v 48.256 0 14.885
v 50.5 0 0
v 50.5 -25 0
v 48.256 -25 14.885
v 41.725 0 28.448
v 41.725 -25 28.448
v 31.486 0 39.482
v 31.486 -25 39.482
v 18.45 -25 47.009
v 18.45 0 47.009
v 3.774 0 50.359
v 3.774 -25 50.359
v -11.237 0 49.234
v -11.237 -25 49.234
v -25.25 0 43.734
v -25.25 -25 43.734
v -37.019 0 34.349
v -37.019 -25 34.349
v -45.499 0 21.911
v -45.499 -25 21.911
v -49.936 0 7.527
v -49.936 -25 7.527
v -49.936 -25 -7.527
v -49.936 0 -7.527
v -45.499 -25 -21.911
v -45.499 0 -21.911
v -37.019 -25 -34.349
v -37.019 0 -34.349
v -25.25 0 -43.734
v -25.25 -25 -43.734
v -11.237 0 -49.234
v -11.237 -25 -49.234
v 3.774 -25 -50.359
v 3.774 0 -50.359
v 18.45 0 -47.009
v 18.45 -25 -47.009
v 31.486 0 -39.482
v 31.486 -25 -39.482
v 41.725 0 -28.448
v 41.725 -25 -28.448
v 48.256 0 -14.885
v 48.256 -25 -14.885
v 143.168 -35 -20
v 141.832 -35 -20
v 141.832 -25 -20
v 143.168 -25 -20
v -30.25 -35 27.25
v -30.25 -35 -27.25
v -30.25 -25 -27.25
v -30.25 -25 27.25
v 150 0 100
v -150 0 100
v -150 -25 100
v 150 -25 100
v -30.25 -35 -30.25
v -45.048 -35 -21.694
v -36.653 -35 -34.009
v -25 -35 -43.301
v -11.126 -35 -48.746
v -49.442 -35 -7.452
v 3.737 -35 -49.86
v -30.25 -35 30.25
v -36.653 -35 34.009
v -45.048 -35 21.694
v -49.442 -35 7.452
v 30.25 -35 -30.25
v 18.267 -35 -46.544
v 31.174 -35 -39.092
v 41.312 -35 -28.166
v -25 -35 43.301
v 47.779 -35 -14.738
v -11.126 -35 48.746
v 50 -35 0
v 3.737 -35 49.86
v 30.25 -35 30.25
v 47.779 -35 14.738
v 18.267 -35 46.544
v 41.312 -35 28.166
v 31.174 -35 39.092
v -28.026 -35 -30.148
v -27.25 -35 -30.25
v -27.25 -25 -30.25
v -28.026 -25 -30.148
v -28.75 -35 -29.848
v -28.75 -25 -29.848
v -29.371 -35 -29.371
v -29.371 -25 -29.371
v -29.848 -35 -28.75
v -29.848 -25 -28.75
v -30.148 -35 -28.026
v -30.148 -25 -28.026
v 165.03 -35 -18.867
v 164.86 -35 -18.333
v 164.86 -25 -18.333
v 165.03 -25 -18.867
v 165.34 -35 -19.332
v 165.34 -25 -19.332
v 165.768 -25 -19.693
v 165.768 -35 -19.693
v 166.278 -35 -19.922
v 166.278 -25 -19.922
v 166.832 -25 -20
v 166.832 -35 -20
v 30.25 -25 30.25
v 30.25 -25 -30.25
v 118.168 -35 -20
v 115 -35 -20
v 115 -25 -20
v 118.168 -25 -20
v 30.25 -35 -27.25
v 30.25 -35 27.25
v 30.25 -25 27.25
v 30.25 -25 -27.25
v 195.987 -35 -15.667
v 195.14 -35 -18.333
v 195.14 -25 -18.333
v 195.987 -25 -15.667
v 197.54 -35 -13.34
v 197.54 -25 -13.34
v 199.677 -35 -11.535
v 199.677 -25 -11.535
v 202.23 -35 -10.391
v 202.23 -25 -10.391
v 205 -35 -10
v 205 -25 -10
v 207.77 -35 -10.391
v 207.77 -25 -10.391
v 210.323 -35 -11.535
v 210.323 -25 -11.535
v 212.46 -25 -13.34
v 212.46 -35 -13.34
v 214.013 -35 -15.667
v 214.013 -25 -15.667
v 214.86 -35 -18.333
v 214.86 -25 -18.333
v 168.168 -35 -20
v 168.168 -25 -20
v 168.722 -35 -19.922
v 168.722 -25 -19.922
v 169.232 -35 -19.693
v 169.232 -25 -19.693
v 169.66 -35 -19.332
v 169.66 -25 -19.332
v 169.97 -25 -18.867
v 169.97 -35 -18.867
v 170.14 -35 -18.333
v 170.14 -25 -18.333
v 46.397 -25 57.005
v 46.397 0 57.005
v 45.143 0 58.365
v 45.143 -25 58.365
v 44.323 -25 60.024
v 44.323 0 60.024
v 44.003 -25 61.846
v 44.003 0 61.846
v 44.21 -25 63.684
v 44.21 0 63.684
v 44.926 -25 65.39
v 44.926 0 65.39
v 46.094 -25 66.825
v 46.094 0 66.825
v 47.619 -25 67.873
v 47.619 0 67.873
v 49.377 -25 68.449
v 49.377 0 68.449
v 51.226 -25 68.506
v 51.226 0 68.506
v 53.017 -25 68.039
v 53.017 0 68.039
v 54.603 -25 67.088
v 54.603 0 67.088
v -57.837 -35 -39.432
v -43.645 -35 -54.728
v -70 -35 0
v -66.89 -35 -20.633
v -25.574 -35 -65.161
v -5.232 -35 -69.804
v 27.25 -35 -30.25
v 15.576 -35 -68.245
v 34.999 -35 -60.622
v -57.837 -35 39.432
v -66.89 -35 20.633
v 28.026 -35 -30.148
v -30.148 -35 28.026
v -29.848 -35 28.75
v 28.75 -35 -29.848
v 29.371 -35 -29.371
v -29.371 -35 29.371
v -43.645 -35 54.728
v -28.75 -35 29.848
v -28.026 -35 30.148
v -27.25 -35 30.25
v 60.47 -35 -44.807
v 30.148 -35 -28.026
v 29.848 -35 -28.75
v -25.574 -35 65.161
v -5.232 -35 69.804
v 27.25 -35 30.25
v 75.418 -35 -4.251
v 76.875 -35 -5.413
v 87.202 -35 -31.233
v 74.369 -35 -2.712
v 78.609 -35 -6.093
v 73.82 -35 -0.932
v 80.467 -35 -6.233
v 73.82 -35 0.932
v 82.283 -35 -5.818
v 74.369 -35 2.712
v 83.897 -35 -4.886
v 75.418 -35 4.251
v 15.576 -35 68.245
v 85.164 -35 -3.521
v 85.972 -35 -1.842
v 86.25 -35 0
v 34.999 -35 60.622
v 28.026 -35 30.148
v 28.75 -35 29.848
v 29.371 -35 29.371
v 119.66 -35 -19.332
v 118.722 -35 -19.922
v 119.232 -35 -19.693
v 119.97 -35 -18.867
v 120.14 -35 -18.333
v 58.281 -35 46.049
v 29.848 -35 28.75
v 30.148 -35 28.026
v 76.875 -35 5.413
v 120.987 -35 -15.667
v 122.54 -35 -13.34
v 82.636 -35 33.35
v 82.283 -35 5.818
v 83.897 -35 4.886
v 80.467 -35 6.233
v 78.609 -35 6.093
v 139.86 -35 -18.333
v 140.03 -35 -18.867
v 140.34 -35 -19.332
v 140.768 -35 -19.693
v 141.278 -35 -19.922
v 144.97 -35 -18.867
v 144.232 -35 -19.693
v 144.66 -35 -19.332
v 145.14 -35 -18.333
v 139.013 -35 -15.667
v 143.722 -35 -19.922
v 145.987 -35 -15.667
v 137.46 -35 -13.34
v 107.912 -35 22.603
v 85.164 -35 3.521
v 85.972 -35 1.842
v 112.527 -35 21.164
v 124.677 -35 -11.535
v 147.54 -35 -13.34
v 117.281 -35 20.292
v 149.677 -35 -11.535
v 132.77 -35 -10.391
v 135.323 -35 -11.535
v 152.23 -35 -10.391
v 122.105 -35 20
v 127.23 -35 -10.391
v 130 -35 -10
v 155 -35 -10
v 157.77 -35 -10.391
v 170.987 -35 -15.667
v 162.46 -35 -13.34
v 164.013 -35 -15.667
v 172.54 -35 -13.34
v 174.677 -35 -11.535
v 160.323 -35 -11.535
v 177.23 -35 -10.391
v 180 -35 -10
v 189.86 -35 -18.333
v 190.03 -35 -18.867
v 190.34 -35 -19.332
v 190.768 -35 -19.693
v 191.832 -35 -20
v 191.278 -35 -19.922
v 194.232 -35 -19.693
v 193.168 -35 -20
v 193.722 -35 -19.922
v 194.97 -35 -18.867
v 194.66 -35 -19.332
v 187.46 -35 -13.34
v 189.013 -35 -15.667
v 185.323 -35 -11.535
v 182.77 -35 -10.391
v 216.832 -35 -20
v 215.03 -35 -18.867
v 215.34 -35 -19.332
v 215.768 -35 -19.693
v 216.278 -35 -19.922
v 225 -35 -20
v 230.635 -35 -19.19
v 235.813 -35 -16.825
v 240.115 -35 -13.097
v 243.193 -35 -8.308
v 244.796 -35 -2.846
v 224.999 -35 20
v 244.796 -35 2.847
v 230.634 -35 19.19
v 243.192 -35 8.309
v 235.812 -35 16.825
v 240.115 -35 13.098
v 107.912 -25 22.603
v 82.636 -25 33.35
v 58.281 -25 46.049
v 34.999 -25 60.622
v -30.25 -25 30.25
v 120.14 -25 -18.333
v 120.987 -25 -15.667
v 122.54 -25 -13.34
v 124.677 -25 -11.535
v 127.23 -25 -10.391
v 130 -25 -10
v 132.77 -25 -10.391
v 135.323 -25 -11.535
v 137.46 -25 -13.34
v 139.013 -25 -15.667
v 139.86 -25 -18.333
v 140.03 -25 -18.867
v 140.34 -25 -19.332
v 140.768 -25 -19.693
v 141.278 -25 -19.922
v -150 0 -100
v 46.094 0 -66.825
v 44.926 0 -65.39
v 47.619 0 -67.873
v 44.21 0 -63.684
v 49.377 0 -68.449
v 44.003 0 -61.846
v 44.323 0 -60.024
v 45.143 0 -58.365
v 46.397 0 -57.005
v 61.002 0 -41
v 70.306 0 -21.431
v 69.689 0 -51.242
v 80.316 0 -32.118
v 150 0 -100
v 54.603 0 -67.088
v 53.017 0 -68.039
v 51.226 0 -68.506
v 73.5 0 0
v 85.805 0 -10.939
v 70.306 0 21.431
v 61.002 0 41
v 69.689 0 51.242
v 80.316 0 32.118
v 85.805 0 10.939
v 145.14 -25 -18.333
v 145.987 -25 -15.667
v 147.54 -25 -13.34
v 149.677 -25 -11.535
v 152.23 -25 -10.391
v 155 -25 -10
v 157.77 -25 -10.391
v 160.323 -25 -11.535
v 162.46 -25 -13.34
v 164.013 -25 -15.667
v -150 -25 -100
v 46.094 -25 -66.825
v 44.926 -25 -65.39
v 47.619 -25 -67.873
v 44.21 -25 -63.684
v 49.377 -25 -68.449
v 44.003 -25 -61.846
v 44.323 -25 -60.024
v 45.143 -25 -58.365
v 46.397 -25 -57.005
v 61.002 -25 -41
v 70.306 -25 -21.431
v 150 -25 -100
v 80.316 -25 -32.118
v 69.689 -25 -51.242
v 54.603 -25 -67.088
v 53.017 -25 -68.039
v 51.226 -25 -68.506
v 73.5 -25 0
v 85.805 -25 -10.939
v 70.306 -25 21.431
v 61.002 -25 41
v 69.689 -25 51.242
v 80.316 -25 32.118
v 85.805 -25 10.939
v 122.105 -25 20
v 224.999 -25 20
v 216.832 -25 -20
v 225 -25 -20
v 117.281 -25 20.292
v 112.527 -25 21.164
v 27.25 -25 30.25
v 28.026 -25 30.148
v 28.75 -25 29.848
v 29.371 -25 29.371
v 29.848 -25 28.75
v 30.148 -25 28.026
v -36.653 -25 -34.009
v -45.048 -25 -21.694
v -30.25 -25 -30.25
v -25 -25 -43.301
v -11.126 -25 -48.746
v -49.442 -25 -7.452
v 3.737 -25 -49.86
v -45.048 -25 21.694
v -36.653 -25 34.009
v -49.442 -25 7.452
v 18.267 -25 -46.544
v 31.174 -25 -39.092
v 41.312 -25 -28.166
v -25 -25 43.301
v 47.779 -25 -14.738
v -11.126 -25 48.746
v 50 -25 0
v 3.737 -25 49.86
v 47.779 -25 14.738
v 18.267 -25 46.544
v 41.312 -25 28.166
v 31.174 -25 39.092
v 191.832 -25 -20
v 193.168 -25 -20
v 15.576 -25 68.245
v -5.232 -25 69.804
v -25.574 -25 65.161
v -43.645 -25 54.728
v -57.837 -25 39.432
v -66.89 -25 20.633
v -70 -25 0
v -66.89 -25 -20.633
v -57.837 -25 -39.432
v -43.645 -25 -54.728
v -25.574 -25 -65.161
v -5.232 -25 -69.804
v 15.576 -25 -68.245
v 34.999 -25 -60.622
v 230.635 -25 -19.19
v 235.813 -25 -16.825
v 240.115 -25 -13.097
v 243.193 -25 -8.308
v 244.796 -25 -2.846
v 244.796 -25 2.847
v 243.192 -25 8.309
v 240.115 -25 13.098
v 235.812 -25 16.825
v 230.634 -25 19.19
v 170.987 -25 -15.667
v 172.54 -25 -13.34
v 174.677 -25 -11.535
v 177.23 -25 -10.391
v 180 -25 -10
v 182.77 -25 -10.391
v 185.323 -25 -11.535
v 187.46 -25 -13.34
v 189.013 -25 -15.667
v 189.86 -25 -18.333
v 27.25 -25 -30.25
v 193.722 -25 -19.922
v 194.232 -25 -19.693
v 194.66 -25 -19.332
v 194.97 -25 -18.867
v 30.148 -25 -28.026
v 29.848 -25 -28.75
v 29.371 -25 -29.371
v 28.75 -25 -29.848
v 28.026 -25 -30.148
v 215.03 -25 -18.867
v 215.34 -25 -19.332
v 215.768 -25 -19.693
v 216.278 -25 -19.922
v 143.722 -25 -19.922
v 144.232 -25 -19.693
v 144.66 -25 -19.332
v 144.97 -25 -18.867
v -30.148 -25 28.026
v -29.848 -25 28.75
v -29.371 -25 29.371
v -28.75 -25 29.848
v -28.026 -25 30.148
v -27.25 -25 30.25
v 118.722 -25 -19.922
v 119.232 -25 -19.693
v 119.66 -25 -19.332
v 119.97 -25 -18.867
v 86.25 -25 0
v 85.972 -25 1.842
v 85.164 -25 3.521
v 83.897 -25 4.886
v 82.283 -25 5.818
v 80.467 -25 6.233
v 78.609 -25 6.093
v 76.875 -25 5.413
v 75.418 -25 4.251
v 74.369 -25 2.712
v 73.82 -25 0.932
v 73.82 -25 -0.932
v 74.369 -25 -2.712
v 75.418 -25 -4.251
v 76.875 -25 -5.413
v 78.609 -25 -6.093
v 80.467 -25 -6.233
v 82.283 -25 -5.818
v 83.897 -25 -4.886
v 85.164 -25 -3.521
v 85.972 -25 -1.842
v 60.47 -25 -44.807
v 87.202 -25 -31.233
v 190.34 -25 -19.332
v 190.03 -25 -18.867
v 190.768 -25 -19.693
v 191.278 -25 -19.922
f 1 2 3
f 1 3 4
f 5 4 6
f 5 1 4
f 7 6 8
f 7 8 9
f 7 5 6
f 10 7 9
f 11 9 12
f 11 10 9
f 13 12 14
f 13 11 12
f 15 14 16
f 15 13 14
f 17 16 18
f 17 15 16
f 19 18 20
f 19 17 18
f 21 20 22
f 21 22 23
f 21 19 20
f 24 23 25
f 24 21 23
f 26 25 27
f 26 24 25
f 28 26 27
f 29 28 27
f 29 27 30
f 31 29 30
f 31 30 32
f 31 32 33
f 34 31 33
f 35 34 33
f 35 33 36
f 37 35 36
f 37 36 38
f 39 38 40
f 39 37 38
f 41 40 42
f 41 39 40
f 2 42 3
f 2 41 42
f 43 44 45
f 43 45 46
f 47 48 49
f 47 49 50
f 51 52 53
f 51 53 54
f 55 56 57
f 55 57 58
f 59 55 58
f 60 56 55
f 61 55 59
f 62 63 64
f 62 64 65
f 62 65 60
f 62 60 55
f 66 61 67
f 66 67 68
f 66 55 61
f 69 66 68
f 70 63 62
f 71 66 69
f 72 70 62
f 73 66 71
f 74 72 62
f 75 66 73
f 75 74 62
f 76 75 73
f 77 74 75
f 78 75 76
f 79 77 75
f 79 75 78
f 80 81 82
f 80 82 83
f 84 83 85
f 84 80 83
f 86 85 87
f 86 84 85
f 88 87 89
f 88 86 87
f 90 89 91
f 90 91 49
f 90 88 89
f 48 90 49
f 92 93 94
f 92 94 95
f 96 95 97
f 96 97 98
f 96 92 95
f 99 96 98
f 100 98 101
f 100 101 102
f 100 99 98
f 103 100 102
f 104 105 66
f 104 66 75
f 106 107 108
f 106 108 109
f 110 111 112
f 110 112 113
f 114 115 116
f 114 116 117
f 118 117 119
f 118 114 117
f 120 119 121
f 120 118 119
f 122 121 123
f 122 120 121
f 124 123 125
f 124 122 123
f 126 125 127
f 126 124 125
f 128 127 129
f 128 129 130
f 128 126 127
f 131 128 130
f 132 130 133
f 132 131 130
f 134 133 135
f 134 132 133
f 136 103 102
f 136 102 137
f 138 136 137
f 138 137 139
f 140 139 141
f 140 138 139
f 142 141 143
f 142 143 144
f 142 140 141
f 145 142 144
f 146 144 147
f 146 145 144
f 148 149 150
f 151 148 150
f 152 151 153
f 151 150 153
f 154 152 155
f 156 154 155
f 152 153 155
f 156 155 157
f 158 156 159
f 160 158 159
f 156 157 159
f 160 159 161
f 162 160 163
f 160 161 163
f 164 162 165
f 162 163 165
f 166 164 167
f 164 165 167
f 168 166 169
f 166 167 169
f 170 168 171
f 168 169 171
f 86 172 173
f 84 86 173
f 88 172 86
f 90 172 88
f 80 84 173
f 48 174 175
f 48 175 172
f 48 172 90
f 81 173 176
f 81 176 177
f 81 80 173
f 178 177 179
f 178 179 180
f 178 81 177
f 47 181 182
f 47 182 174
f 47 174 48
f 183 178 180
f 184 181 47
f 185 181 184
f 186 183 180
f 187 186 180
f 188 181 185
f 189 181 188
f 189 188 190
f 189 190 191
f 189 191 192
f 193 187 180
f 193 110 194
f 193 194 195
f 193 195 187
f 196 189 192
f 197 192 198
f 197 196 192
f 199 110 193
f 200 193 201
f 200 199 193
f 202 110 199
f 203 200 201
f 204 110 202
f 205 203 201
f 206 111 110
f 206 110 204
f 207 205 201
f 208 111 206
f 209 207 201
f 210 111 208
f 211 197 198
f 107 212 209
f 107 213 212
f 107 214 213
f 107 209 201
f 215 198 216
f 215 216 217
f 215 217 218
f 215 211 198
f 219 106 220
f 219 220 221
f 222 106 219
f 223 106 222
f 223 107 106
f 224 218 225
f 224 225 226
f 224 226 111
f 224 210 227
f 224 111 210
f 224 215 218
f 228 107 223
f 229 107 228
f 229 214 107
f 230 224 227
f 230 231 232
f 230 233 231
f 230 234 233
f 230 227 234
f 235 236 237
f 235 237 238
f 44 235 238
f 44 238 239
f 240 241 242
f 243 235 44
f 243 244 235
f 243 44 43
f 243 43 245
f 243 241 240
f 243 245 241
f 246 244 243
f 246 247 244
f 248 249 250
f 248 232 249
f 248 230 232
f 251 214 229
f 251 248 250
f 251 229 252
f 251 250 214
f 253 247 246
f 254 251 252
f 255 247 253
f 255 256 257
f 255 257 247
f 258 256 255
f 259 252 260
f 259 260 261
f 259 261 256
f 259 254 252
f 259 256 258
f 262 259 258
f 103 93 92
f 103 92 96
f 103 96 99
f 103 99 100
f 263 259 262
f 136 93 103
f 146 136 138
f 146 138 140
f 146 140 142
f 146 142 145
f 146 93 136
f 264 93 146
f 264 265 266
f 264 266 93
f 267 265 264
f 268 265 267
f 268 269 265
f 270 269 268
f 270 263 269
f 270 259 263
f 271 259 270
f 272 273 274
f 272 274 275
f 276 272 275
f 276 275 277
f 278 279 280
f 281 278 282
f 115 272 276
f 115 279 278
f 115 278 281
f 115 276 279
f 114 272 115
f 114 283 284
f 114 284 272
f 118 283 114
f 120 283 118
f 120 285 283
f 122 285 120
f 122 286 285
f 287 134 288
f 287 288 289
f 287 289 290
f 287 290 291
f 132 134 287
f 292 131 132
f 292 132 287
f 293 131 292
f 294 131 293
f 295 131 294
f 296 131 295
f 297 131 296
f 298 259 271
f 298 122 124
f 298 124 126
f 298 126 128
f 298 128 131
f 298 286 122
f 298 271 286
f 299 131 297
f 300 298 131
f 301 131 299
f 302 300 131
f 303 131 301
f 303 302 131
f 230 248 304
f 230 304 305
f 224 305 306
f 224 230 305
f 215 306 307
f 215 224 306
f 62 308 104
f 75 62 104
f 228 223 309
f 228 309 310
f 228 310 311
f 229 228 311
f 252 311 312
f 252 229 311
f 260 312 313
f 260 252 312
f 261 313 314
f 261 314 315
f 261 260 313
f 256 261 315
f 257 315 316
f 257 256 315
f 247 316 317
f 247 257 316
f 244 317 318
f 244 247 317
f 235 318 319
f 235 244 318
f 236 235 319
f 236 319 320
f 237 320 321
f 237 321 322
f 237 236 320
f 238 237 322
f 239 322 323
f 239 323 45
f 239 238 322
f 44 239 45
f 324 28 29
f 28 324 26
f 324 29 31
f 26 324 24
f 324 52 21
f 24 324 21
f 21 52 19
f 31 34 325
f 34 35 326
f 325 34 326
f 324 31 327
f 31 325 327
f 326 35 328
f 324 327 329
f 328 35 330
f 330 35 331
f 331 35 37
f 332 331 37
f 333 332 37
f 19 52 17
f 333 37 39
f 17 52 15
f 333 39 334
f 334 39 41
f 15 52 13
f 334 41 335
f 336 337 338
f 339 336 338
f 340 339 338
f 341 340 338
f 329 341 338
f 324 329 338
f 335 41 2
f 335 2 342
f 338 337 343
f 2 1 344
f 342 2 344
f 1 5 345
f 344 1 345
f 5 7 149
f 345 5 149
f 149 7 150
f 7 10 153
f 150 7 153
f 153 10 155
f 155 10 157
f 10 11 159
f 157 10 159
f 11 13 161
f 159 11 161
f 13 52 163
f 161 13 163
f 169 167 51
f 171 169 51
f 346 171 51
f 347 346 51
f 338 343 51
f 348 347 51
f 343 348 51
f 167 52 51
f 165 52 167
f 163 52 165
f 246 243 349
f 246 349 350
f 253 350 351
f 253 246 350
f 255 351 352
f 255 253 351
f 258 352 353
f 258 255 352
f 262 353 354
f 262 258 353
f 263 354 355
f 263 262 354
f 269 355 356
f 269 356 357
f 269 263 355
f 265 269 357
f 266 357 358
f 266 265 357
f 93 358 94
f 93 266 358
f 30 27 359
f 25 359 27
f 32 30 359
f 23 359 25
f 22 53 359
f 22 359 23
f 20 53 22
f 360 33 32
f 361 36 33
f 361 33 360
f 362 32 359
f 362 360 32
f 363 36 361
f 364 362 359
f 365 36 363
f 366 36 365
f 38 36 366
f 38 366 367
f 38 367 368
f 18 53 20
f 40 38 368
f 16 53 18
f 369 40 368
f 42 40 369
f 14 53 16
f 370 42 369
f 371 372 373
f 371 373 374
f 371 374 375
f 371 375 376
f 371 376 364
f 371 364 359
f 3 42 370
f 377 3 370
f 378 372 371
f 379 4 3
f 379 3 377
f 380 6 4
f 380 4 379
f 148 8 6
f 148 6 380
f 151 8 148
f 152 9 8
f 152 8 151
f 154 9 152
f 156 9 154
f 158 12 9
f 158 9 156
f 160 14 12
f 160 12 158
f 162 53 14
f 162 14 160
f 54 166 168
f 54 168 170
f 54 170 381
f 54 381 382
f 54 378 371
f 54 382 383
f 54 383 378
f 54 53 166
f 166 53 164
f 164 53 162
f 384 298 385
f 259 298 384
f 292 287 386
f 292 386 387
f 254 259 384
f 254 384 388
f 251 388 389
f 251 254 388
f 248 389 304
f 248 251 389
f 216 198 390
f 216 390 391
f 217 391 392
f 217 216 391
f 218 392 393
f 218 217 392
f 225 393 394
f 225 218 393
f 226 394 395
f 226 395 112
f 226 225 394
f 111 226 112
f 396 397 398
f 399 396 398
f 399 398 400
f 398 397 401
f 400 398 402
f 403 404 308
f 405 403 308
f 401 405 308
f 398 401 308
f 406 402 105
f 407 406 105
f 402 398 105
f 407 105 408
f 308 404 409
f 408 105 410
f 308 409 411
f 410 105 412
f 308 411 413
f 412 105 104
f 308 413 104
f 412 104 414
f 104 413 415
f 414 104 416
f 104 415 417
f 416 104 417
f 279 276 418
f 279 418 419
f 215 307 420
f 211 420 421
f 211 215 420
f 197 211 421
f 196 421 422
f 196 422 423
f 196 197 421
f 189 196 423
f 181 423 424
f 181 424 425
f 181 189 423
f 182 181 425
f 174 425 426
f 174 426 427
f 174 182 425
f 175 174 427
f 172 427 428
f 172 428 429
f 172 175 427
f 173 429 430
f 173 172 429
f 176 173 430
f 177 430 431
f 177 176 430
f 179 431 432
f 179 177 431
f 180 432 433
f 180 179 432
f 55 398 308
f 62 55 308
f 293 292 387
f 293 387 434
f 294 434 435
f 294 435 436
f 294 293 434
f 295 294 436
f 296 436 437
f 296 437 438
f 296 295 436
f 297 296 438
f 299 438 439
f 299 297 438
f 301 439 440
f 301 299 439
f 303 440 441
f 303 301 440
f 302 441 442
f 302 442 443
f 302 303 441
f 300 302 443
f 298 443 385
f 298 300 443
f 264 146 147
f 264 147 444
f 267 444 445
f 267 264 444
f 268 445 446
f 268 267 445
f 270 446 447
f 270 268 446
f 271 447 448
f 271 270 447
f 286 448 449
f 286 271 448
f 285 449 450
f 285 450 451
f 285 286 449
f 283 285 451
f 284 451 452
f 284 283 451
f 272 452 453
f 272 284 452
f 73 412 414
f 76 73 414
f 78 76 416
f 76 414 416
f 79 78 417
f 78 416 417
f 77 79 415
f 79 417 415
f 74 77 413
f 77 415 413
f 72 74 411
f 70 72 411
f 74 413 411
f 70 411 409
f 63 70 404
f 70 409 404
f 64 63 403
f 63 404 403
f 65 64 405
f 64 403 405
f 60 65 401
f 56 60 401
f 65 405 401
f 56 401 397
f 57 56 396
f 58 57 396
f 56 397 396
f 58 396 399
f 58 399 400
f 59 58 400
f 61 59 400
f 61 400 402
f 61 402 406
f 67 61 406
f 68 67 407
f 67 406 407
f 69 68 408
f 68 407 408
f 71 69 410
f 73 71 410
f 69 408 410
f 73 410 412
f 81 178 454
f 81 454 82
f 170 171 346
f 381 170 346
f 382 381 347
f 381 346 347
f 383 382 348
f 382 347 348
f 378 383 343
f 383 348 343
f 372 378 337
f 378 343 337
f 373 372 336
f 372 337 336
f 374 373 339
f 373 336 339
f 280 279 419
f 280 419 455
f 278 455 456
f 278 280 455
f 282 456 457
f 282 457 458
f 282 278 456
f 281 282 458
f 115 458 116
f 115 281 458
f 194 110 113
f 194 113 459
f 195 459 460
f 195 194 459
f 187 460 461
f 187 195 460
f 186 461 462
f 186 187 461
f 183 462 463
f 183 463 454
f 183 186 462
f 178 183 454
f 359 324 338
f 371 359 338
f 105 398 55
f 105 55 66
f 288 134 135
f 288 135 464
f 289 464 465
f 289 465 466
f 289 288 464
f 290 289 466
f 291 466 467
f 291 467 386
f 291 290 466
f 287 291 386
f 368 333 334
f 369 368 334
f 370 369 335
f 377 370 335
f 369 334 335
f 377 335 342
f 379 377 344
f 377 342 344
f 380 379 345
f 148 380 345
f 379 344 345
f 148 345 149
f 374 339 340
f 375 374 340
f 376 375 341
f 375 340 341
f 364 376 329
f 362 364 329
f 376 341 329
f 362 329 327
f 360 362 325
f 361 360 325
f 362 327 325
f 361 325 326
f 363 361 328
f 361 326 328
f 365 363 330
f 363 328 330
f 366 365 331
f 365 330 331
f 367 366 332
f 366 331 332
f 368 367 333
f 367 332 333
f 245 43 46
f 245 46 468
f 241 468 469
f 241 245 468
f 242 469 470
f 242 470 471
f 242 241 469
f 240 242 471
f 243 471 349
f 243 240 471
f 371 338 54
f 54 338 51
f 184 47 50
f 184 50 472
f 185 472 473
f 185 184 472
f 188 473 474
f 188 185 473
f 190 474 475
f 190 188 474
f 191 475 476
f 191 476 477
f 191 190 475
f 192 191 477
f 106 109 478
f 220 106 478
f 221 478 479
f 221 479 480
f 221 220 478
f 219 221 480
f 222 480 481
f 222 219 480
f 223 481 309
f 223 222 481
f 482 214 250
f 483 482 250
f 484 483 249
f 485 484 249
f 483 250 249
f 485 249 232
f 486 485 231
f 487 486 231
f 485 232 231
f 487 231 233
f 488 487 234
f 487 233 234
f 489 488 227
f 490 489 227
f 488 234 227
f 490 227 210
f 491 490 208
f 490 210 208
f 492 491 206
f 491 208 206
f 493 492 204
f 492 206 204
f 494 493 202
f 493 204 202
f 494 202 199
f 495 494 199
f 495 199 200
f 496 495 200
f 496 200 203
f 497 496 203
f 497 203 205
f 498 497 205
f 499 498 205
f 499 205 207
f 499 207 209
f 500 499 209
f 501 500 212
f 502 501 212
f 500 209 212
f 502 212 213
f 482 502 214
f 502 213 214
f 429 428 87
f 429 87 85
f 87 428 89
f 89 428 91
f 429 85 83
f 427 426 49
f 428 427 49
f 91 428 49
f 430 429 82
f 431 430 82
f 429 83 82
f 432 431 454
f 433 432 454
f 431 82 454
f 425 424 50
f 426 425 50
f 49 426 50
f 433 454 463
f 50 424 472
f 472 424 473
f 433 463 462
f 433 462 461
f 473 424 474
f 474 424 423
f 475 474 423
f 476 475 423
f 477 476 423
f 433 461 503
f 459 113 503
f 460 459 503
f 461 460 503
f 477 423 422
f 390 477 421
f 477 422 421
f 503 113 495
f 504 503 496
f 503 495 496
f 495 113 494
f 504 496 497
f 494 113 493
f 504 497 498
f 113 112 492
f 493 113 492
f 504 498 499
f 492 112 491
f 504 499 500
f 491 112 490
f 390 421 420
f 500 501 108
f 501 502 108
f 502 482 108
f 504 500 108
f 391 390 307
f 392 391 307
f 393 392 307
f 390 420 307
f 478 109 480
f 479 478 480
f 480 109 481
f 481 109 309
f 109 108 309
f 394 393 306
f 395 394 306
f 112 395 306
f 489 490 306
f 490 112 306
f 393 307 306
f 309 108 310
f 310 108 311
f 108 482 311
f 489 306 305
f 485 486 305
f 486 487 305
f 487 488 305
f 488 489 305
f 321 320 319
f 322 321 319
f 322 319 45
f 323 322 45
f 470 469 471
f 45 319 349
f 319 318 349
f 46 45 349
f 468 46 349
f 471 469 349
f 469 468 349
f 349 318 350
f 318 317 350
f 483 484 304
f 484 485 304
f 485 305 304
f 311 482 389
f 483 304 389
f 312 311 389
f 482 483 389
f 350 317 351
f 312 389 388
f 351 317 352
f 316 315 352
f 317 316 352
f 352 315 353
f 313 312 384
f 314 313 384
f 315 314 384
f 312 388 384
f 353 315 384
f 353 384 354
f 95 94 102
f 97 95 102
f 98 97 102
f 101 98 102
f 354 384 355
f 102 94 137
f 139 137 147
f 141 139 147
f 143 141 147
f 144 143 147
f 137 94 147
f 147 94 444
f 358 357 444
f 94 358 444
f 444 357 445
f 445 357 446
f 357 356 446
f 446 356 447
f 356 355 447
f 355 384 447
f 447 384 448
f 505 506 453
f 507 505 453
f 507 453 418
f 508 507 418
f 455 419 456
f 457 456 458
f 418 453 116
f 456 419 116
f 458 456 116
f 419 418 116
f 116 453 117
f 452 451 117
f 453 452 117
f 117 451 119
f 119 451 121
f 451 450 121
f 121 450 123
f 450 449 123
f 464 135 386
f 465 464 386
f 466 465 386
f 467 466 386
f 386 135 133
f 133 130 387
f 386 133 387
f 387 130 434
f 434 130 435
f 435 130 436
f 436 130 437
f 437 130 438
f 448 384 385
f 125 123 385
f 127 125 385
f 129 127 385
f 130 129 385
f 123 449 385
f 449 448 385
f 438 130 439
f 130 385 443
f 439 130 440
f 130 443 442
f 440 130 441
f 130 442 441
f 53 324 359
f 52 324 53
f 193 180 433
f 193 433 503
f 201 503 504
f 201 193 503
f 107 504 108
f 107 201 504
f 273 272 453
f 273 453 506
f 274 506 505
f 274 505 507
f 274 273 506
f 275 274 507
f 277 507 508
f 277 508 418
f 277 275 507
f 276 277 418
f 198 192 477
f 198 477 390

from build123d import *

# Parameters (mm, degrees)
F0_W     = 300
F0_H     = 200
F0_R     = 50.5
F1_DEPTH = 25
F2_R     = 50
F2_W     = 60.5
F2_H     = 60.5
F3_DEPTH = 10
F4_R     = 6.25
F5_DEPTH = 10


with BuildPart() as f1:
    # F0 (on Front) → F1 (new body)
    with BuildSketch(Plane.XZ):
        Rectangle(F0_W, F0_H)
        Circle(F0_R, mode=Mode.SUBTRACT)
        with BuildLine():
            ThreePointArc((54.603125, 67.08762), (86.5, 0), (54.603125, -67.08762))
            ThreePointArc((54.603125, -67.08762), (45.458734, -66.149479), (46.396875, -57.005087))
            ThreePointArc((46.396875, -57.005087), (73.5, 0), (46.396875, 57.005087))
            ThreePointArc((46.396875, 57.005087), (45.458734, 66.149479), (54.603125, 67.08762))
        make_face(mode=Mode.SUBTRACT)
    extrude(amount=F1_DEPTH)


with BuildPart() as f3:
    # F2 (on face) → F3 (new body)
    with BuildSketch(Plane.XZ.offset(25)):
        Circle(F2_R)
        Rectangle(F2_W, F2_H, mode=Mode.SUBTRACT)
    extrude(amount=F3_DEPTH)


with BuildPart() as f5:
    # F4 (on face) → F5 (new body)
    with BuildSketch(Plane.XZ.offset(35)):
        with BuildLine():
            Line((216.83216, -20), (225, -20))
            ThreePointArc((225, -20), (245, 0.00035), (224.9993, 20))
            Line((224.9993, 20), (122.105245, 20))
            ThreePointArc((122.105245, 20), (114.890427, 20.65605), (107.912272, 22.60268))
            ThreePointArc((107.912272, 22.60268), (70.333638, 39.460401), (34.9993, 60.622182))
            ThreePointArc((34.9993, 60.622182), (-70, 0), (34.9993, -60.622182))
            ThreePointArc((34.9993, -60.622182), (73.690555, -37.732979), (115, -20))
            Line((115, -20), (118.16784, -20))
            ThreePointArc((118.16784, -20), (119.458835, -19.527525), (120.139867, -18.333333))
            ThreePointArc((120.139867, -18.333333), (130, -10), (139.860133, -18.333333))
            ThreePointArc((139.860133, -18.333333), (140.541165, -19.527525), (141.83216, -20))
            Line((141.83216, -20), (143.16784, -20))
            ThreePointArc((143.16784, -20), (144.458835, -19.527525), (145.139867, -18.333333))
            ThreePointArc((145.139867, -18.333333), (155, -10), (164.860133, -18.333333))
            ThreePointArc((164.860133, -18.333333), (165.541165, -19.527525), (166.83216, -20))
            Line((166.83216, -20), (168.16784, -20))
            ThreePointArc((168.16784, -20), (169.458835, -19.527525), (170.139867, -18.333333))
            ThreePointArc((170.139867, -18.333333), (180, -10), (189.860133, -18.333333))
            ThreePointArc((189.860133, -18.333333), (190.541165, -19.527525), (191.83216, -20))
            Line((191.83216, -20), (193.16784, -20))
            ThreePointArc((193.16784, -20), (194.458835, -19.527525), (195.139867, -18.333333))
            ThreePointArc((195.139867, -18.333333), (205, -10), (214.860133, -18.333333))
            ThreePointArc((214.860133, -18.333333), (215.541165, -19.527525), (216.83216, -20))
        make_face()
        with BuildLine():
            Line((-27.25, 30.25), (27.25, 30.25))
            ThreePointArc((27.25, 30.25), (29.37132, 29.37132), (30.25, 27.25))
            Line((30.25, 27.25), (30.25, -27.25))
            ThreePointArc((30.25, -27.25), (29.37132, -29.37132), (27.25, -30.25))
            Line((27.25, -30.25), (-27.25, -30.25))
            ThreePointArc((-27.25, -30.25), (-29.37132, -29.37132), (-30.25, -27.25))
            Line((-30.25, -27.25), (-30.25, 27.25))
            ThreePointArc((-30.25, 27.25), (-29.37132, 29.37132), (-27.25, 30.25))
        make_face(mode=Mode.SUBTRACT)
        with Locations((80, 0)):
            Circle(F4_R, mode=Mode.SUBTRACT)
    extrude(amount=-F5_DEPTH)


solid = Compound([f1.part, f3.part, f5.part])
